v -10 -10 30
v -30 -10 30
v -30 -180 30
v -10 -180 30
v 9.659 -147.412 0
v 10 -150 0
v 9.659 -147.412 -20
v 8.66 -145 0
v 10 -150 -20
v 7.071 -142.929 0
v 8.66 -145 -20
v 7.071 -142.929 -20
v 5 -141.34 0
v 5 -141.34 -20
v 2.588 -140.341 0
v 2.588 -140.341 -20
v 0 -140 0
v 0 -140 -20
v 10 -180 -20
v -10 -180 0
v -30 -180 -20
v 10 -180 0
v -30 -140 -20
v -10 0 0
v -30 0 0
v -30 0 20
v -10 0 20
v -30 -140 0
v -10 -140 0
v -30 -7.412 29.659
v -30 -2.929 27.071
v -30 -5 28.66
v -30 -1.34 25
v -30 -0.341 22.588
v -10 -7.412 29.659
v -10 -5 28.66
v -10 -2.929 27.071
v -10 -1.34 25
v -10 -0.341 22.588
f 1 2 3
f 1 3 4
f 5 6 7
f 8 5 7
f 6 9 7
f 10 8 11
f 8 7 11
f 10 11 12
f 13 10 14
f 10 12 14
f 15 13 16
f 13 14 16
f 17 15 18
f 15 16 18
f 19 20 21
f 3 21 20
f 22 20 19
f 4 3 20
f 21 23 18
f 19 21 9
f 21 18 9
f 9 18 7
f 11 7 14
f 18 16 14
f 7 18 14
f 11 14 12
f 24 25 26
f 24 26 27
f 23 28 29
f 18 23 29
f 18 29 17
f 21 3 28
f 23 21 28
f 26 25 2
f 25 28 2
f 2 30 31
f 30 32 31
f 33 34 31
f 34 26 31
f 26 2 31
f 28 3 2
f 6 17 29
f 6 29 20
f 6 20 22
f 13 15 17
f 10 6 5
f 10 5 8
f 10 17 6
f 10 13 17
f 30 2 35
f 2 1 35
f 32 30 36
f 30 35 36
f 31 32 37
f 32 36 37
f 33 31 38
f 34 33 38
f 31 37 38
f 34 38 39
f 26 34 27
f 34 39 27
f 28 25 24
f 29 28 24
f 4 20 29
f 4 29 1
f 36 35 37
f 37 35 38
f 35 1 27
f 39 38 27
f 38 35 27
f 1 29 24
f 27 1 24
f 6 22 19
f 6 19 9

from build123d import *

# Parameters (mm, degrees)
SKETCH1_W           = 20
SKETCH1_H           = 180
BOSS_EXTRUDE1_DEPTH = 30
SKETCH2_W           = 40
SKETCH2_H           = 40
BOSS_EXTRUDE2_DEPTH = 20
FILLET1_R           = 10


with BuildPart() as part:
    # Sketch1 → Boss-Extrude1 (new body)
    with BuildSketch(Plane.XY):
        with Locations((-20, -90)):
            Rectangle(SKETCH1_W, SKETCH1_H)
    extrude(amount=BOSS_EXTRUDE1_DEPTH)

    # Sketch2 → Boss-Extrude2 (add)
    with BuildSketch(Plane.XY):
        with Locations((-10, -160)):
            Rectangle(SKETCH2_W, SKETCH2_H)
    extrude(amount=-BOSS_EXTRUDE2_DEPTH)

    # Fillet1
    fillet1_edges = [part.edges().sort_by_distance(p)[0] for p in [
        (10, -140, -10),
        (-20, 0, 30),
    ]]
    fillet(fillet1_edges, radius=FILLET1_R)


solid = part.part
